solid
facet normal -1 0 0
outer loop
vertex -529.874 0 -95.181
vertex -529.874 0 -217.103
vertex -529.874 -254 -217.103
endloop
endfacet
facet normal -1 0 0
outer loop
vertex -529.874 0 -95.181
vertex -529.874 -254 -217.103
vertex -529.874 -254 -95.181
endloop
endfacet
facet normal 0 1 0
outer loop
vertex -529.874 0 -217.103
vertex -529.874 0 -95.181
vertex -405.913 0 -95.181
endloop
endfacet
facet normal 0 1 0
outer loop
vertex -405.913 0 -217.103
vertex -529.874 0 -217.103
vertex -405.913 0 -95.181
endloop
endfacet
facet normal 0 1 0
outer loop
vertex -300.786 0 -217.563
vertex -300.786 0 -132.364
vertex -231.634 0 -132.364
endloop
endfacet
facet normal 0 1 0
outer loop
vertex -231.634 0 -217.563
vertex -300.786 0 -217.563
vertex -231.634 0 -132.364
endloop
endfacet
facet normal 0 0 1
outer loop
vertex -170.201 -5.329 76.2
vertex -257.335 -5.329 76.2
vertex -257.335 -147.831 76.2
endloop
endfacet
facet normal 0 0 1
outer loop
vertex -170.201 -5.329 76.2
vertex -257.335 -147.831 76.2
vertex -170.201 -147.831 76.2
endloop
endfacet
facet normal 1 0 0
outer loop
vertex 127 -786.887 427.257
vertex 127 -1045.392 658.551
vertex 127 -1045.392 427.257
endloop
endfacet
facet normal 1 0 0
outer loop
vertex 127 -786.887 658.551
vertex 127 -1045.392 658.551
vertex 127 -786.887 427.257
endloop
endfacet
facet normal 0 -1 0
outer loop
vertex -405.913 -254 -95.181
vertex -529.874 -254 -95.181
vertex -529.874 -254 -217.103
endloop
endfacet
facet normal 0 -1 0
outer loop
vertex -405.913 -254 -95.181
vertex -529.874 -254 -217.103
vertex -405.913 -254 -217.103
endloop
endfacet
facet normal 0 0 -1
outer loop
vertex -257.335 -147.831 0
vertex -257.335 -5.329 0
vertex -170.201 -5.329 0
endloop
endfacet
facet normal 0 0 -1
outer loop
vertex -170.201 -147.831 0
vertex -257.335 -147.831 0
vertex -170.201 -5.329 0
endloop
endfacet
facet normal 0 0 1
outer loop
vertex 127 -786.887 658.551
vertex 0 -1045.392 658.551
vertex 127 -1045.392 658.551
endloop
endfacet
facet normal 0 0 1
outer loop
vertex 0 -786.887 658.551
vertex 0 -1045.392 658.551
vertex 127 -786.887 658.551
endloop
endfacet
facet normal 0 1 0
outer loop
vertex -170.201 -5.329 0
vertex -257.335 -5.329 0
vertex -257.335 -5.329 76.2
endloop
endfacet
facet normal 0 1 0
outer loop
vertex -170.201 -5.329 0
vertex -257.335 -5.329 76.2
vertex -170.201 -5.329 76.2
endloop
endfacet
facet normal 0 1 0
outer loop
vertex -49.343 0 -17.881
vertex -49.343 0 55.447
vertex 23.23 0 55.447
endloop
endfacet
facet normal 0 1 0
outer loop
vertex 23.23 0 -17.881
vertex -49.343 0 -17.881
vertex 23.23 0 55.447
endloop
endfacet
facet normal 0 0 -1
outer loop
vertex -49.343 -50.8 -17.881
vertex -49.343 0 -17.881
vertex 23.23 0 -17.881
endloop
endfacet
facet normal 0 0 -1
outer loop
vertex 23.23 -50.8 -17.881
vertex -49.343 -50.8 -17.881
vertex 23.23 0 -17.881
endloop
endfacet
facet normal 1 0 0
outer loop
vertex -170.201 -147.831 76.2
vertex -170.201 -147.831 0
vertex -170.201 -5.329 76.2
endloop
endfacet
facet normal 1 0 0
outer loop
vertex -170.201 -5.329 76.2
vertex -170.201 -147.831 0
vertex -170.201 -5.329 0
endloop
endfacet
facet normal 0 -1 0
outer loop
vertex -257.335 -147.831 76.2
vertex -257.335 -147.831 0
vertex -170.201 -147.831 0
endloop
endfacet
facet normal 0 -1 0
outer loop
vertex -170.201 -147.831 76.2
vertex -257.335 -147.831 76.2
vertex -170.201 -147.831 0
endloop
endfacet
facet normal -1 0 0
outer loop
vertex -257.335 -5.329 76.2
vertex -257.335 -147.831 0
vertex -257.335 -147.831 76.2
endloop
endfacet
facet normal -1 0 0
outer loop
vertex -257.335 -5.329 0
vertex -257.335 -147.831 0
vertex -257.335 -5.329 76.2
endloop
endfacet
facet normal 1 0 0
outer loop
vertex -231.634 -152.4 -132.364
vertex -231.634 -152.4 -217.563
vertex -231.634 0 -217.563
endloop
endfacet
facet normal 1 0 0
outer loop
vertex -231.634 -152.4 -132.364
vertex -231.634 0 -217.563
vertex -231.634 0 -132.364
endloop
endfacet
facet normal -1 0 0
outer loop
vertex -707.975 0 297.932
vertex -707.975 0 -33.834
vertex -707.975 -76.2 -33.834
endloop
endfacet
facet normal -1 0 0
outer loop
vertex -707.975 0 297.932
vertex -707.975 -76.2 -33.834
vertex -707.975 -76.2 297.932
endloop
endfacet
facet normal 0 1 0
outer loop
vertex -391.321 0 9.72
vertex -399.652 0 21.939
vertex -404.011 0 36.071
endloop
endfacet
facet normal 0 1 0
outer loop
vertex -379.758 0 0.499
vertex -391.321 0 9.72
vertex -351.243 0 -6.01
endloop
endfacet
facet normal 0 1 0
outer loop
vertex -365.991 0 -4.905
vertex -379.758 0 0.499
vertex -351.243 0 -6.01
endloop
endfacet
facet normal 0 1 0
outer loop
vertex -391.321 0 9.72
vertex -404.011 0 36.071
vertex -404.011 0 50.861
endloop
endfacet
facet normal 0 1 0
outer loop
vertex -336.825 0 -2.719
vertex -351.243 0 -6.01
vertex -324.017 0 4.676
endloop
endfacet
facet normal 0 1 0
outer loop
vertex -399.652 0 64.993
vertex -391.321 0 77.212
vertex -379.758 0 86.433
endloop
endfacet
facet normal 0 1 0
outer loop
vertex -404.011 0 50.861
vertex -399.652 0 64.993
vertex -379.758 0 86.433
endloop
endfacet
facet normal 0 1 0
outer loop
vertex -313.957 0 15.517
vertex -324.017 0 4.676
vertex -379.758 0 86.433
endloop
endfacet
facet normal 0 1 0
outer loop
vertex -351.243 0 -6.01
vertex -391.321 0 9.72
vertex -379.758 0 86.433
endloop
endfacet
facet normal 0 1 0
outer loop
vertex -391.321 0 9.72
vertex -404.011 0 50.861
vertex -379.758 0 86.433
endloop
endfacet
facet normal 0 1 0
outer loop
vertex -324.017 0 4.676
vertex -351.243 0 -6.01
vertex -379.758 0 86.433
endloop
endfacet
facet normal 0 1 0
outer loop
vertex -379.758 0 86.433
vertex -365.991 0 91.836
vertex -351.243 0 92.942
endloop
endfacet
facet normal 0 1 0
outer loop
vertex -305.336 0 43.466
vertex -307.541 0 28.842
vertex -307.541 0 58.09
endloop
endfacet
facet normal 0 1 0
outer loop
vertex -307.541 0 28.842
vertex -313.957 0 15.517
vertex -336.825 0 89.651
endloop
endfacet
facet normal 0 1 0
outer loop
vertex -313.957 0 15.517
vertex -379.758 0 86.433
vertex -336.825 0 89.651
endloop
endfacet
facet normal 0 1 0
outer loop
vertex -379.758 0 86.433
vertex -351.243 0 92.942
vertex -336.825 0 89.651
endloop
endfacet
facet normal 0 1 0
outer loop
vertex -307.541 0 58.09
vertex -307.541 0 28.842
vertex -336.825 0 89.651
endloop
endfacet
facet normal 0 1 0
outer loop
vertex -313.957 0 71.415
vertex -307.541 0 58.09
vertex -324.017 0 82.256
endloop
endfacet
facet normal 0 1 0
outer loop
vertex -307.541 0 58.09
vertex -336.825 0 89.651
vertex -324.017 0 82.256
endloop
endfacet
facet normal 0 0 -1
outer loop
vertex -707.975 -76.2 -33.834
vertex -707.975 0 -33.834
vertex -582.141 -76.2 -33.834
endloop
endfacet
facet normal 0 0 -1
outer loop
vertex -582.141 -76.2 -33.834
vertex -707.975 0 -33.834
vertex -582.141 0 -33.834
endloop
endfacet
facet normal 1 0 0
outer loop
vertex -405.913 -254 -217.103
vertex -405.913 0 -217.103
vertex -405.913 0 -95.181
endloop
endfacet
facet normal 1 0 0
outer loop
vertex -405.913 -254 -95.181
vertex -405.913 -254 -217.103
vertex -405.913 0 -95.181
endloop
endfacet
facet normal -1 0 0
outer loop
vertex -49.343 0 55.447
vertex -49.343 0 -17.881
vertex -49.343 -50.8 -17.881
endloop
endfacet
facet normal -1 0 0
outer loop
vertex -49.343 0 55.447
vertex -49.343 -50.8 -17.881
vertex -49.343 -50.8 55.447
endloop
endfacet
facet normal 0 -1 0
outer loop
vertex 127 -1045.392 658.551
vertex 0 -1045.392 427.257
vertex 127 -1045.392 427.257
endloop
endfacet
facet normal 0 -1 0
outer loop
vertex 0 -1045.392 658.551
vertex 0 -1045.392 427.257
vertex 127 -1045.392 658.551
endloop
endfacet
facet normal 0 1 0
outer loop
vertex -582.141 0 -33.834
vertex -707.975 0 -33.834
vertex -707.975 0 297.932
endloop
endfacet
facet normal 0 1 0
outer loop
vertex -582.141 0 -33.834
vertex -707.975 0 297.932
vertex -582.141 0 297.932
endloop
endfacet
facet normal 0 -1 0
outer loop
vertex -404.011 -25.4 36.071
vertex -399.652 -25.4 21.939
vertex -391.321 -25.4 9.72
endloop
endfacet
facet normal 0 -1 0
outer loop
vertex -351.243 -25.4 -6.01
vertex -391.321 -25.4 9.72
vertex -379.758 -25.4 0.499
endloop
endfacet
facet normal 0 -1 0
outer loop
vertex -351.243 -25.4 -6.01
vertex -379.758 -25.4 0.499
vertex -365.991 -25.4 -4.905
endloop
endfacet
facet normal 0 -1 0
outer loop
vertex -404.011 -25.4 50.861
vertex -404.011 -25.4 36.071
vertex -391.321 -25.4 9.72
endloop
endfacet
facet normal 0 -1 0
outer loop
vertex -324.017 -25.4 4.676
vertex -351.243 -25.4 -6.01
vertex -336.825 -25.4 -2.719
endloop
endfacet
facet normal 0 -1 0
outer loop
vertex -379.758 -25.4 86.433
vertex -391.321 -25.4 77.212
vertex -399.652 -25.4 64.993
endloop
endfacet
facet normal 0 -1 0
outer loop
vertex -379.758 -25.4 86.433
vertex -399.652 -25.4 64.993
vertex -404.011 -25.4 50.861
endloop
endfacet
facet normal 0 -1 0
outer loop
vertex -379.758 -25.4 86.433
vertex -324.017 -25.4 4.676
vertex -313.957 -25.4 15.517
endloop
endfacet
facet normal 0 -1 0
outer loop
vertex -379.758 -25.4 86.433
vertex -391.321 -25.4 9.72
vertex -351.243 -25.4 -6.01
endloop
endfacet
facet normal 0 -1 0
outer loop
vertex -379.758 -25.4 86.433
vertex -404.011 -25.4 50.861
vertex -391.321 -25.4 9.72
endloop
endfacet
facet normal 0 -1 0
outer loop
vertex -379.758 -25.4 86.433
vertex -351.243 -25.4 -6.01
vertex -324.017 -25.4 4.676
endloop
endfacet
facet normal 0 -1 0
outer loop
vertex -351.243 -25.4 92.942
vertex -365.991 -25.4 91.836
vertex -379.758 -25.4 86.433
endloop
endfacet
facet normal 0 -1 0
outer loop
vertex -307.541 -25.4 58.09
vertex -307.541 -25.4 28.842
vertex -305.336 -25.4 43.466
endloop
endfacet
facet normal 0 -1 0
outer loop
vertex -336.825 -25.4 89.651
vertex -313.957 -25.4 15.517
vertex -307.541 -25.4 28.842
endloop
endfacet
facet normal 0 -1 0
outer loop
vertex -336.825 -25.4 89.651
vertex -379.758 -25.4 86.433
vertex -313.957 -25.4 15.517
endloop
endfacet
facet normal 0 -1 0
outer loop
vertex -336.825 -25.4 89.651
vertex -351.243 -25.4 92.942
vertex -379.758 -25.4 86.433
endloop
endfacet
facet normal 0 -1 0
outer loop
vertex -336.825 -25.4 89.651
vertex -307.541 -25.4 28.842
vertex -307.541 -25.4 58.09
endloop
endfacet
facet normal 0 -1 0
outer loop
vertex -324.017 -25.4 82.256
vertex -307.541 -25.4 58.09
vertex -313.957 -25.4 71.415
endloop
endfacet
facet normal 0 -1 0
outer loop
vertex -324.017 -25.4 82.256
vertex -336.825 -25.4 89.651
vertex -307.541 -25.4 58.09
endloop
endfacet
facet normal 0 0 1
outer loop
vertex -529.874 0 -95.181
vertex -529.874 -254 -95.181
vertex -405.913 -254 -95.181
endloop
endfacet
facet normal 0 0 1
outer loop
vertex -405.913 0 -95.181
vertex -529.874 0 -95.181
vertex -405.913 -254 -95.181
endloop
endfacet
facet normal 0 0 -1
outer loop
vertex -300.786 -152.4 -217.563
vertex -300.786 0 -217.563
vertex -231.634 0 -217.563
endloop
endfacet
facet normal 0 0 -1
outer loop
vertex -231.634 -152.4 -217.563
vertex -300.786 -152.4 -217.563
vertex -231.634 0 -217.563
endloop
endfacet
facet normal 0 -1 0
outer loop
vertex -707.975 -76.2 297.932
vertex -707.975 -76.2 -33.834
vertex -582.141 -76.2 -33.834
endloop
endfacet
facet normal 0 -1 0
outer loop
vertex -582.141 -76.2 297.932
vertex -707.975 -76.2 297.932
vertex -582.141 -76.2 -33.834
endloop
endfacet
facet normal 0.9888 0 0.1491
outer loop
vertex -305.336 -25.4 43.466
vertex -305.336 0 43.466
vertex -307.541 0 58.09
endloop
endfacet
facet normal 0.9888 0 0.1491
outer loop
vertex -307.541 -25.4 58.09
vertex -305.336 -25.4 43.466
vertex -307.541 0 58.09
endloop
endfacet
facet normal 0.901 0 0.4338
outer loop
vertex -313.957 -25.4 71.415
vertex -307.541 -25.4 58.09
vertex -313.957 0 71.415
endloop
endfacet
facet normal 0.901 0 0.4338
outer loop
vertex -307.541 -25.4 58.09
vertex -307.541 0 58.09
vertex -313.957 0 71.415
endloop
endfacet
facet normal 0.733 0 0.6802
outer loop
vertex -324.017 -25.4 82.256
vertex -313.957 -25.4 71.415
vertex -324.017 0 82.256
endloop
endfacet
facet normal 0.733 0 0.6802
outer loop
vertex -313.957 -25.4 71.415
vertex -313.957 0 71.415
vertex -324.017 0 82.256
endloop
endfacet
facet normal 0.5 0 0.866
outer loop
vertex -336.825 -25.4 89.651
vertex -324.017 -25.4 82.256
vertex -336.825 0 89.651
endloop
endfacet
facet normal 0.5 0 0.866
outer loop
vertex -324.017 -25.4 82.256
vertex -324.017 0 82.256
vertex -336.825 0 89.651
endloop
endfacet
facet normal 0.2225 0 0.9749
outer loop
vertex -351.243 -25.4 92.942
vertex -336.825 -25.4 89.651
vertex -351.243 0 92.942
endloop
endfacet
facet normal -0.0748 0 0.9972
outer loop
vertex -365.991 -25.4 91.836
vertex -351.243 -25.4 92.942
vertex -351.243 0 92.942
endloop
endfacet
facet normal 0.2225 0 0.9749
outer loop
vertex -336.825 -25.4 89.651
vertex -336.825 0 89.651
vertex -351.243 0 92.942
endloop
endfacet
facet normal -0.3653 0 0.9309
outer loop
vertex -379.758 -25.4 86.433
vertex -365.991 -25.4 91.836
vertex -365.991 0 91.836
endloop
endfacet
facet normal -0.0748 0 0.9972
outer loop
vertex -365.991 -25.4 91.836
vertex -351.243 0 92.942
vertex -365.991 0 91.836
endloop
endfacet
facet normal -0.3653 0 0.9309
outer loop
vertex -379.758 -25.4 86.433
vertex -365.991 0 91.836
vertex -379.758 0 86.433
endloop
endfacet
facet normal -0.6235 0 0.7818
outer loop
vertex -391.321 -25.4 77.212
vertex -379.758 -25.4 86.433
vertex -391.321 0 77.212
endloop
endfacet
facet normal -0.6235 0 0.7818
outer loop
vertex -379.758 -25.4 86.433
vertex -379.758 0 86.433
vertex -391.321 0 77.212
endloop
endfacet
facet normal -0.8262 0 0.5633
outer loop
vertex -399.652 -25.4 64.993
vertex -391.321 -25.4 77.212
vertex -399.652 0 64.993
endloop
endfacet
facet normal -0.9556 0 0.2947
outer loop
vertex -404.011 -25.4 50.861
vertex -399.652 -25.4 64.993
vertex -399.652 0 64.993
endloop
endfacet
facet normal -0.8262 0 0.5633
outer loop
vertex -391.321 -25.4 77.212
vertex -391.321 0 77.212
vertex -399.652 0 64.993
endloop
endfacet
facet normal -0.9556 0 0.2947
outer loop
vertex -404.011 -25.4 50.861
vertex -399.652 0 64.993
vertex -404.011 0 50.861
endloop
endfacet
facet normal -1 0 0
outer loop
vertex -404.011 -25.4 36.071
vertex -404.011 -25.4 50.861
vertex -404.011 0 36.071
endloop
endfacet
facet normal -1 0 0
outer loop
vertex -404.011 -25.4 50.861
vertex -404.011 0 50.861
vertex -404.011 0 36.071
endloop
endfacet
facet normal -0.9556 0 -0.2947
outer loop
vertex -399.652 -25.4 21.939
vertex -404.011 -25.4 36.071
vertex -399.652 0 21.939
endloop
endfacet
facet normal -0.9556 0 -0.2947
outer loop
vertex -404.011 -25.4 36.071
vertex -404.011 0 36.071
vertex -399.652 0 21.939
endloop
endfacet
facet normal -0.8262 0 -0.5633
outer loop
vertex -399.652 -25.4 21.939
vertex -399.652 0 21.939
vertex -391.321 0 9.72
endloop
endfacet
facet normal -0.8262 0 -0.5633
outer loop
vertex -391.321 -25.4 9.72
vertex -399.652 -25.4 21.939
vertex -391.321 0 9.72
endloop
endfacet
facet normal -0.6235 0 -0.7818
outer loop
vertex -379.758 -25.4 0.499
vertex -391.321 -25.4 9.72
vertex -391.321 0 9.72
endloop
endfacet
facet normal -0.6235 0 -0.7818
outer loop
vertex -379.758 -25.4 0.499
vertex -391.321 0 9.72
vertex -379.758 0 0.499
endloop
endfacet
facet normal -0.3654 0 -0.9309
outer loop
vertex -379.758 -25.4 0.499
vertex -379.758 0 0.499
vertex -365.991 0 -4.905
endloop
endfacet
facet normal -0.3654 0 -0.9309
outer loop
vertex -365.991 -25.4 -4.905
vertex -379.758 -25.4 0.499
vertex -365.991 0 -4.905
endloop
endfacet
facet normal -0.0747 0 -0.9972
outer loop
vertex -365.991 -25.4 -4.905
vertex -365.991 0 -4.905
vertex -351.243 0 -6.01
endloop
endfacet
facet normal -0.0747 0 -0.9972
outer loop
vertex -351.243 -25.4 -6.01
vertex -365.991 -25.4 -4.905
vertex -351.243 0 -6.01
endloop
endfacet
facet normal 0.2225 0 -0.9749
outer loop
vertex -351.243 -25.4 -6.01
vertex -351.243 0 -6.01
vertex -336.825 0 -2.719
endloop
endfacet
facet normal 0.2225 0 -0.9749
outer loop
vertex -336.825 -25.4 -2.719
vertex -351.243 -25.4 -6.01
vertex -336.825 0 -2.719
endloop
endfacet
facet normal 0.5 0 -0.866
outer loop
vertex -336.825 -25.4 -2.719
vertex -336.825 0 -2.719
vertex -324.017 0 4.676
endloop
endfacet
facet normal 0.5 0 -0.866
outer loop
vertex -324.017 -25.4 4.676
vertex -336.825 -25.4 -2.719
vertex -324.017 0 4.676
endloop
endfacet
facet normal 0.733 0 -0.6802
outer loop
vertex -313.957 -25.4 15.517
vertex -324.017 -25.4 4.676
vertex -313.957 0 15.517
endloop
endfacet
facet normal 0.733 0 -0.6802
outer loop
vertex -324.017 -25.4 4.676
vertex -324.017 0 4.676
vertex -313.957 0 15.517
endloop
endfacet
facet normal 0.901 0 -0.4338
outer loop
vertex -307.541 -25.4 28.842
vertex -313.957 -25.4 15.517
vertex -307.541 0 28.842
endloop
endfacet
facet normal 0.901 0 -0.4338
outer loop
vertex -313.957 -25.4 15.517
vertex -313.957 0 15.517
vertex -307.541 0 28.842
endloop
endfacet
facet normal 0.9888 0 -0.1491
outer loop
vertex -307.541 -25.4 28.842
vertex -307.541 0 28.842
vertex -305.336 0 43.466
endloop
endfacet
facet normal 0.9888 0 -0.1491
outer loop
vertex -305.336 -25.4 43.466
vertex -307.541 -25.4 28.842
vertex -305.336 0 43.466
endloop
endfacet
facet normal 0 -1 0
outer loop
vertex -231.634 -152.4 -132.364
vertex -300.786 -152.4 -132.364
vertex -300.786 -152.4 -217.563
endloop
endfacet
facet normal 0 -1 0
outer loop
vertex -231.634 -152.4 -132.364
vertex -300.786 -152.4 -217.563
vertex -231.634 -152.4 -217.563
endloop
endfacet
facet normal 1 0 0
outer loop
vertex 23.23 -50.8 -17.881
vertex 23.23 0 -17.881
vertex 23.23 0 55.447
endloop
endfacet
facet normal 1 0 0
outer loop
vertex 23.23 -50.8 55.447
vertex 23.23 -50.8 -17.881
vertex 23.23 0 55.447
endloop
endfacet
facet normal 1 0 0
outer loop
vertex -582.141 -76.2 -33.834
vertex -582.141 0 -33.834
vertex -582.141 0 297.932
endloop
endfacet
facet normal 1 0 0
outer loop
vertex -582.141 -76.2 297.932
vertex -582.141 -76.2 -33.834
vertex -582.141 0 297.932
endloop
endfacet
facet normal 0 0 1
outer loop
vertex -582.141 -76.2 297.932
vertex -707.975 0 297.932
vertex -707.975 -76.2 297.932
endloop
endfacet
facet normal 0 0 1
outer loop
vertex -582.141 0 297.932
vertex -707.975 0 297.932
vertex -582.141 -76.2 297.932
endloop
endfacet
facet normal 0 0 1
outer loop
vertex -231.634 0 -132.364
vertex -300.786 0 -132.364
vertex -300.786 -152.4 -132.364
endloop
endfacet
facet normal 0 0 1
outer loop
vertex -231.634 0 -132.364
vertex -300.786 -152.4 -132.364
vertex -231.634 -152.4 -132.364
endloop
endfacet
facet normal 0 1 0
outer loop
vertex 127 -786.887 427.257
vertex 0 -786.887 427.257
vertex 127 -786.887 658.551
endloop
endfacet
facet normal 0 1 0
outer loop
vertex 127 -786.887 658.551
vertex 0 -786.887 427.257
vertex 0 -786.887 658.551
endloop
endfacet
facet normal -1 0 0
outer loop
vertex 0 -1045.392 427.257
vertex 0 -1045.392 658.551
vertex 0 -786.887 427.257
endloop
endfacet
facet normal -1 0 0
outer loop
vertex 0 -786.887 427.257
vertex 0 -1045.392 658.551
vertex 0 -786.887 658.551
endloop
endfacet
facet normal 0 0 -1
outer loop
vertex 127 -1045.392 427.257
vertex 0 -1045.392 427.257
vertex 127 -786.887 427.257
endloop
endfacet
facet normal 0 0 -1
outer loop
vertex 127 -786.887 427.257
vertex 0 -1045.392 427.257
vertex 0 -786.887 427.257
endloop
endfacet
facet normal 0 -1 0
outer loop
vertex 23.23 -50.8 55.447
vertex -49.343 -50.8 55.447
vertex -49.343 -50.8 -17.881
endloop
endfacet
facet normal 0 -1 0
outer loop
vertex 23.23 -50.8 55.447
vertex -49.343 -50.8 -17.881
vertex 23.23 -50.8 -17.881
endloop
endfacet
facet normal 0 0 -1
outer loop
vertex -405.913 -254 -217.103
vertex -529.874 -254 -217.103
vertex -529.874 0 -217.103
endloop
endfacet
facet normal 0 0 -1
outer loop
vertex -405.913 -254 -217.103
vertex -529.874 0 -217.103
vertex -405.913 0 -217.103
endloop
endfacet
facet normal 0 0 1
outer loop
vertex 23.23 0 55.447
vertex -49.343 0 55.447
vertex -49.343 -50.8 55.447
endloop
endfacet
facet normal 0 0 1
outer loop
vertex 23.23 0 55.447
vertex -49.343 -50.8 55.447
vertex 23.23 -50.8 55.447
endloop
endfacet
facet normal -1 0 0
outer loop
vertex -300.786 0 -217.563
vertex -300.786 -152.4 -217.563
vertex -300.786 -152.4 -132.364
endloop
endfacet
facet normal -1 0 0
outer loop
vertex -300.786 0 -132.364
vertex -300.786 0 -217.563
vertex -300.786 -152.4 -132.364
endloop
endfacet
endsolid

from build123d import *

# Parameters (mm, degrees)
F0_W      = 72.573338
F0_H      = 73.327383
F1_DEPTH  = 50.8
F2_W      = 69.151819
F2_H      = 85.198536
F3_DEPTH  = 152.4
F4_W      = 87.134377
F4_H      = 142.50181
F5_DEPTH  = 76.2
F6_R      = 49.61442
F7_DEPTH  = 25.4
F8_W      = 123.961538
F8_H      = 121.921949
F9_DEPTH  = 254
F10_W     = 258.504569
F10_H     = 231.293172
F11_DEPTH = 127
F12_W     = 125.834048
F12_H     = 331.76554
F13_DEPTH = 76.2


with BuildPart() as f1:
    # F0 (on Front) → F1 (new body)
    with BuildSketch(Plane.XZ):
        with Locations((-13.056414, 18.78293)):
            Rectangle(F0_W, F0_H)
    extrude(amount=F1_DEPTH)


with BuildPart() as f3:
    # F2 (on Front) → F3 (new body)
    with BuildSketch(Plane.XZ):
        with Locations((-266.210169, -174.963288)):
            Rectangle(F2_W, F2_H)
    extrude(amount=F3_DEPTH)


with BuildPart() as f5:
    # F4 (on Top) → F5 (new body)
    with BuildSketch(Plane.XY):
        with Locations((-213.768207, -76.57985)):
            Rectangle(F4_W, F4_H)
    extrude(amount=F5_DEPTH)


with BuildPart() as f7:
    # F6 (on Front) → F7 (new body)
    with BuildSketch(Plane.XZ):
        with Locations((-354.950786, 43.465886)):
            Circle(F6_R)
    extrude(amount=F7_DEPTH)


with BuildPart() as f9:
    # F8 (on Front) → F9 (new body)
    with BuildSketch(Plane.XZ):
        with Locations((-467.893496, -156.141538)):
            Rectangle(F8_W, F8_H)
    extrude(amount=F9_DEPTH)


with BuildPart() as f11:
    # F10 (on Right) → F11 (new body)
    with BuildSketch(Plane.YZ):
        with Locations((-916.139632, 542.904034)):
            Rectangle(F10_W, F10_H)
    extrude(amount=F11_DEPTH)


with BuildPart() as f13:
    # F12 (on Front) → F13 (new body)
    with BuildSketch(Plane.XZ):
        with Locations((-645.058066, 132.048871)):
            Rectangle(F12_W, F12_H)
    extrude(amount=F13_DEPTH)


solid = Compound([f1.part, f3.part, f5.part, f7.part, f9.part, f11.part, f13.part])
